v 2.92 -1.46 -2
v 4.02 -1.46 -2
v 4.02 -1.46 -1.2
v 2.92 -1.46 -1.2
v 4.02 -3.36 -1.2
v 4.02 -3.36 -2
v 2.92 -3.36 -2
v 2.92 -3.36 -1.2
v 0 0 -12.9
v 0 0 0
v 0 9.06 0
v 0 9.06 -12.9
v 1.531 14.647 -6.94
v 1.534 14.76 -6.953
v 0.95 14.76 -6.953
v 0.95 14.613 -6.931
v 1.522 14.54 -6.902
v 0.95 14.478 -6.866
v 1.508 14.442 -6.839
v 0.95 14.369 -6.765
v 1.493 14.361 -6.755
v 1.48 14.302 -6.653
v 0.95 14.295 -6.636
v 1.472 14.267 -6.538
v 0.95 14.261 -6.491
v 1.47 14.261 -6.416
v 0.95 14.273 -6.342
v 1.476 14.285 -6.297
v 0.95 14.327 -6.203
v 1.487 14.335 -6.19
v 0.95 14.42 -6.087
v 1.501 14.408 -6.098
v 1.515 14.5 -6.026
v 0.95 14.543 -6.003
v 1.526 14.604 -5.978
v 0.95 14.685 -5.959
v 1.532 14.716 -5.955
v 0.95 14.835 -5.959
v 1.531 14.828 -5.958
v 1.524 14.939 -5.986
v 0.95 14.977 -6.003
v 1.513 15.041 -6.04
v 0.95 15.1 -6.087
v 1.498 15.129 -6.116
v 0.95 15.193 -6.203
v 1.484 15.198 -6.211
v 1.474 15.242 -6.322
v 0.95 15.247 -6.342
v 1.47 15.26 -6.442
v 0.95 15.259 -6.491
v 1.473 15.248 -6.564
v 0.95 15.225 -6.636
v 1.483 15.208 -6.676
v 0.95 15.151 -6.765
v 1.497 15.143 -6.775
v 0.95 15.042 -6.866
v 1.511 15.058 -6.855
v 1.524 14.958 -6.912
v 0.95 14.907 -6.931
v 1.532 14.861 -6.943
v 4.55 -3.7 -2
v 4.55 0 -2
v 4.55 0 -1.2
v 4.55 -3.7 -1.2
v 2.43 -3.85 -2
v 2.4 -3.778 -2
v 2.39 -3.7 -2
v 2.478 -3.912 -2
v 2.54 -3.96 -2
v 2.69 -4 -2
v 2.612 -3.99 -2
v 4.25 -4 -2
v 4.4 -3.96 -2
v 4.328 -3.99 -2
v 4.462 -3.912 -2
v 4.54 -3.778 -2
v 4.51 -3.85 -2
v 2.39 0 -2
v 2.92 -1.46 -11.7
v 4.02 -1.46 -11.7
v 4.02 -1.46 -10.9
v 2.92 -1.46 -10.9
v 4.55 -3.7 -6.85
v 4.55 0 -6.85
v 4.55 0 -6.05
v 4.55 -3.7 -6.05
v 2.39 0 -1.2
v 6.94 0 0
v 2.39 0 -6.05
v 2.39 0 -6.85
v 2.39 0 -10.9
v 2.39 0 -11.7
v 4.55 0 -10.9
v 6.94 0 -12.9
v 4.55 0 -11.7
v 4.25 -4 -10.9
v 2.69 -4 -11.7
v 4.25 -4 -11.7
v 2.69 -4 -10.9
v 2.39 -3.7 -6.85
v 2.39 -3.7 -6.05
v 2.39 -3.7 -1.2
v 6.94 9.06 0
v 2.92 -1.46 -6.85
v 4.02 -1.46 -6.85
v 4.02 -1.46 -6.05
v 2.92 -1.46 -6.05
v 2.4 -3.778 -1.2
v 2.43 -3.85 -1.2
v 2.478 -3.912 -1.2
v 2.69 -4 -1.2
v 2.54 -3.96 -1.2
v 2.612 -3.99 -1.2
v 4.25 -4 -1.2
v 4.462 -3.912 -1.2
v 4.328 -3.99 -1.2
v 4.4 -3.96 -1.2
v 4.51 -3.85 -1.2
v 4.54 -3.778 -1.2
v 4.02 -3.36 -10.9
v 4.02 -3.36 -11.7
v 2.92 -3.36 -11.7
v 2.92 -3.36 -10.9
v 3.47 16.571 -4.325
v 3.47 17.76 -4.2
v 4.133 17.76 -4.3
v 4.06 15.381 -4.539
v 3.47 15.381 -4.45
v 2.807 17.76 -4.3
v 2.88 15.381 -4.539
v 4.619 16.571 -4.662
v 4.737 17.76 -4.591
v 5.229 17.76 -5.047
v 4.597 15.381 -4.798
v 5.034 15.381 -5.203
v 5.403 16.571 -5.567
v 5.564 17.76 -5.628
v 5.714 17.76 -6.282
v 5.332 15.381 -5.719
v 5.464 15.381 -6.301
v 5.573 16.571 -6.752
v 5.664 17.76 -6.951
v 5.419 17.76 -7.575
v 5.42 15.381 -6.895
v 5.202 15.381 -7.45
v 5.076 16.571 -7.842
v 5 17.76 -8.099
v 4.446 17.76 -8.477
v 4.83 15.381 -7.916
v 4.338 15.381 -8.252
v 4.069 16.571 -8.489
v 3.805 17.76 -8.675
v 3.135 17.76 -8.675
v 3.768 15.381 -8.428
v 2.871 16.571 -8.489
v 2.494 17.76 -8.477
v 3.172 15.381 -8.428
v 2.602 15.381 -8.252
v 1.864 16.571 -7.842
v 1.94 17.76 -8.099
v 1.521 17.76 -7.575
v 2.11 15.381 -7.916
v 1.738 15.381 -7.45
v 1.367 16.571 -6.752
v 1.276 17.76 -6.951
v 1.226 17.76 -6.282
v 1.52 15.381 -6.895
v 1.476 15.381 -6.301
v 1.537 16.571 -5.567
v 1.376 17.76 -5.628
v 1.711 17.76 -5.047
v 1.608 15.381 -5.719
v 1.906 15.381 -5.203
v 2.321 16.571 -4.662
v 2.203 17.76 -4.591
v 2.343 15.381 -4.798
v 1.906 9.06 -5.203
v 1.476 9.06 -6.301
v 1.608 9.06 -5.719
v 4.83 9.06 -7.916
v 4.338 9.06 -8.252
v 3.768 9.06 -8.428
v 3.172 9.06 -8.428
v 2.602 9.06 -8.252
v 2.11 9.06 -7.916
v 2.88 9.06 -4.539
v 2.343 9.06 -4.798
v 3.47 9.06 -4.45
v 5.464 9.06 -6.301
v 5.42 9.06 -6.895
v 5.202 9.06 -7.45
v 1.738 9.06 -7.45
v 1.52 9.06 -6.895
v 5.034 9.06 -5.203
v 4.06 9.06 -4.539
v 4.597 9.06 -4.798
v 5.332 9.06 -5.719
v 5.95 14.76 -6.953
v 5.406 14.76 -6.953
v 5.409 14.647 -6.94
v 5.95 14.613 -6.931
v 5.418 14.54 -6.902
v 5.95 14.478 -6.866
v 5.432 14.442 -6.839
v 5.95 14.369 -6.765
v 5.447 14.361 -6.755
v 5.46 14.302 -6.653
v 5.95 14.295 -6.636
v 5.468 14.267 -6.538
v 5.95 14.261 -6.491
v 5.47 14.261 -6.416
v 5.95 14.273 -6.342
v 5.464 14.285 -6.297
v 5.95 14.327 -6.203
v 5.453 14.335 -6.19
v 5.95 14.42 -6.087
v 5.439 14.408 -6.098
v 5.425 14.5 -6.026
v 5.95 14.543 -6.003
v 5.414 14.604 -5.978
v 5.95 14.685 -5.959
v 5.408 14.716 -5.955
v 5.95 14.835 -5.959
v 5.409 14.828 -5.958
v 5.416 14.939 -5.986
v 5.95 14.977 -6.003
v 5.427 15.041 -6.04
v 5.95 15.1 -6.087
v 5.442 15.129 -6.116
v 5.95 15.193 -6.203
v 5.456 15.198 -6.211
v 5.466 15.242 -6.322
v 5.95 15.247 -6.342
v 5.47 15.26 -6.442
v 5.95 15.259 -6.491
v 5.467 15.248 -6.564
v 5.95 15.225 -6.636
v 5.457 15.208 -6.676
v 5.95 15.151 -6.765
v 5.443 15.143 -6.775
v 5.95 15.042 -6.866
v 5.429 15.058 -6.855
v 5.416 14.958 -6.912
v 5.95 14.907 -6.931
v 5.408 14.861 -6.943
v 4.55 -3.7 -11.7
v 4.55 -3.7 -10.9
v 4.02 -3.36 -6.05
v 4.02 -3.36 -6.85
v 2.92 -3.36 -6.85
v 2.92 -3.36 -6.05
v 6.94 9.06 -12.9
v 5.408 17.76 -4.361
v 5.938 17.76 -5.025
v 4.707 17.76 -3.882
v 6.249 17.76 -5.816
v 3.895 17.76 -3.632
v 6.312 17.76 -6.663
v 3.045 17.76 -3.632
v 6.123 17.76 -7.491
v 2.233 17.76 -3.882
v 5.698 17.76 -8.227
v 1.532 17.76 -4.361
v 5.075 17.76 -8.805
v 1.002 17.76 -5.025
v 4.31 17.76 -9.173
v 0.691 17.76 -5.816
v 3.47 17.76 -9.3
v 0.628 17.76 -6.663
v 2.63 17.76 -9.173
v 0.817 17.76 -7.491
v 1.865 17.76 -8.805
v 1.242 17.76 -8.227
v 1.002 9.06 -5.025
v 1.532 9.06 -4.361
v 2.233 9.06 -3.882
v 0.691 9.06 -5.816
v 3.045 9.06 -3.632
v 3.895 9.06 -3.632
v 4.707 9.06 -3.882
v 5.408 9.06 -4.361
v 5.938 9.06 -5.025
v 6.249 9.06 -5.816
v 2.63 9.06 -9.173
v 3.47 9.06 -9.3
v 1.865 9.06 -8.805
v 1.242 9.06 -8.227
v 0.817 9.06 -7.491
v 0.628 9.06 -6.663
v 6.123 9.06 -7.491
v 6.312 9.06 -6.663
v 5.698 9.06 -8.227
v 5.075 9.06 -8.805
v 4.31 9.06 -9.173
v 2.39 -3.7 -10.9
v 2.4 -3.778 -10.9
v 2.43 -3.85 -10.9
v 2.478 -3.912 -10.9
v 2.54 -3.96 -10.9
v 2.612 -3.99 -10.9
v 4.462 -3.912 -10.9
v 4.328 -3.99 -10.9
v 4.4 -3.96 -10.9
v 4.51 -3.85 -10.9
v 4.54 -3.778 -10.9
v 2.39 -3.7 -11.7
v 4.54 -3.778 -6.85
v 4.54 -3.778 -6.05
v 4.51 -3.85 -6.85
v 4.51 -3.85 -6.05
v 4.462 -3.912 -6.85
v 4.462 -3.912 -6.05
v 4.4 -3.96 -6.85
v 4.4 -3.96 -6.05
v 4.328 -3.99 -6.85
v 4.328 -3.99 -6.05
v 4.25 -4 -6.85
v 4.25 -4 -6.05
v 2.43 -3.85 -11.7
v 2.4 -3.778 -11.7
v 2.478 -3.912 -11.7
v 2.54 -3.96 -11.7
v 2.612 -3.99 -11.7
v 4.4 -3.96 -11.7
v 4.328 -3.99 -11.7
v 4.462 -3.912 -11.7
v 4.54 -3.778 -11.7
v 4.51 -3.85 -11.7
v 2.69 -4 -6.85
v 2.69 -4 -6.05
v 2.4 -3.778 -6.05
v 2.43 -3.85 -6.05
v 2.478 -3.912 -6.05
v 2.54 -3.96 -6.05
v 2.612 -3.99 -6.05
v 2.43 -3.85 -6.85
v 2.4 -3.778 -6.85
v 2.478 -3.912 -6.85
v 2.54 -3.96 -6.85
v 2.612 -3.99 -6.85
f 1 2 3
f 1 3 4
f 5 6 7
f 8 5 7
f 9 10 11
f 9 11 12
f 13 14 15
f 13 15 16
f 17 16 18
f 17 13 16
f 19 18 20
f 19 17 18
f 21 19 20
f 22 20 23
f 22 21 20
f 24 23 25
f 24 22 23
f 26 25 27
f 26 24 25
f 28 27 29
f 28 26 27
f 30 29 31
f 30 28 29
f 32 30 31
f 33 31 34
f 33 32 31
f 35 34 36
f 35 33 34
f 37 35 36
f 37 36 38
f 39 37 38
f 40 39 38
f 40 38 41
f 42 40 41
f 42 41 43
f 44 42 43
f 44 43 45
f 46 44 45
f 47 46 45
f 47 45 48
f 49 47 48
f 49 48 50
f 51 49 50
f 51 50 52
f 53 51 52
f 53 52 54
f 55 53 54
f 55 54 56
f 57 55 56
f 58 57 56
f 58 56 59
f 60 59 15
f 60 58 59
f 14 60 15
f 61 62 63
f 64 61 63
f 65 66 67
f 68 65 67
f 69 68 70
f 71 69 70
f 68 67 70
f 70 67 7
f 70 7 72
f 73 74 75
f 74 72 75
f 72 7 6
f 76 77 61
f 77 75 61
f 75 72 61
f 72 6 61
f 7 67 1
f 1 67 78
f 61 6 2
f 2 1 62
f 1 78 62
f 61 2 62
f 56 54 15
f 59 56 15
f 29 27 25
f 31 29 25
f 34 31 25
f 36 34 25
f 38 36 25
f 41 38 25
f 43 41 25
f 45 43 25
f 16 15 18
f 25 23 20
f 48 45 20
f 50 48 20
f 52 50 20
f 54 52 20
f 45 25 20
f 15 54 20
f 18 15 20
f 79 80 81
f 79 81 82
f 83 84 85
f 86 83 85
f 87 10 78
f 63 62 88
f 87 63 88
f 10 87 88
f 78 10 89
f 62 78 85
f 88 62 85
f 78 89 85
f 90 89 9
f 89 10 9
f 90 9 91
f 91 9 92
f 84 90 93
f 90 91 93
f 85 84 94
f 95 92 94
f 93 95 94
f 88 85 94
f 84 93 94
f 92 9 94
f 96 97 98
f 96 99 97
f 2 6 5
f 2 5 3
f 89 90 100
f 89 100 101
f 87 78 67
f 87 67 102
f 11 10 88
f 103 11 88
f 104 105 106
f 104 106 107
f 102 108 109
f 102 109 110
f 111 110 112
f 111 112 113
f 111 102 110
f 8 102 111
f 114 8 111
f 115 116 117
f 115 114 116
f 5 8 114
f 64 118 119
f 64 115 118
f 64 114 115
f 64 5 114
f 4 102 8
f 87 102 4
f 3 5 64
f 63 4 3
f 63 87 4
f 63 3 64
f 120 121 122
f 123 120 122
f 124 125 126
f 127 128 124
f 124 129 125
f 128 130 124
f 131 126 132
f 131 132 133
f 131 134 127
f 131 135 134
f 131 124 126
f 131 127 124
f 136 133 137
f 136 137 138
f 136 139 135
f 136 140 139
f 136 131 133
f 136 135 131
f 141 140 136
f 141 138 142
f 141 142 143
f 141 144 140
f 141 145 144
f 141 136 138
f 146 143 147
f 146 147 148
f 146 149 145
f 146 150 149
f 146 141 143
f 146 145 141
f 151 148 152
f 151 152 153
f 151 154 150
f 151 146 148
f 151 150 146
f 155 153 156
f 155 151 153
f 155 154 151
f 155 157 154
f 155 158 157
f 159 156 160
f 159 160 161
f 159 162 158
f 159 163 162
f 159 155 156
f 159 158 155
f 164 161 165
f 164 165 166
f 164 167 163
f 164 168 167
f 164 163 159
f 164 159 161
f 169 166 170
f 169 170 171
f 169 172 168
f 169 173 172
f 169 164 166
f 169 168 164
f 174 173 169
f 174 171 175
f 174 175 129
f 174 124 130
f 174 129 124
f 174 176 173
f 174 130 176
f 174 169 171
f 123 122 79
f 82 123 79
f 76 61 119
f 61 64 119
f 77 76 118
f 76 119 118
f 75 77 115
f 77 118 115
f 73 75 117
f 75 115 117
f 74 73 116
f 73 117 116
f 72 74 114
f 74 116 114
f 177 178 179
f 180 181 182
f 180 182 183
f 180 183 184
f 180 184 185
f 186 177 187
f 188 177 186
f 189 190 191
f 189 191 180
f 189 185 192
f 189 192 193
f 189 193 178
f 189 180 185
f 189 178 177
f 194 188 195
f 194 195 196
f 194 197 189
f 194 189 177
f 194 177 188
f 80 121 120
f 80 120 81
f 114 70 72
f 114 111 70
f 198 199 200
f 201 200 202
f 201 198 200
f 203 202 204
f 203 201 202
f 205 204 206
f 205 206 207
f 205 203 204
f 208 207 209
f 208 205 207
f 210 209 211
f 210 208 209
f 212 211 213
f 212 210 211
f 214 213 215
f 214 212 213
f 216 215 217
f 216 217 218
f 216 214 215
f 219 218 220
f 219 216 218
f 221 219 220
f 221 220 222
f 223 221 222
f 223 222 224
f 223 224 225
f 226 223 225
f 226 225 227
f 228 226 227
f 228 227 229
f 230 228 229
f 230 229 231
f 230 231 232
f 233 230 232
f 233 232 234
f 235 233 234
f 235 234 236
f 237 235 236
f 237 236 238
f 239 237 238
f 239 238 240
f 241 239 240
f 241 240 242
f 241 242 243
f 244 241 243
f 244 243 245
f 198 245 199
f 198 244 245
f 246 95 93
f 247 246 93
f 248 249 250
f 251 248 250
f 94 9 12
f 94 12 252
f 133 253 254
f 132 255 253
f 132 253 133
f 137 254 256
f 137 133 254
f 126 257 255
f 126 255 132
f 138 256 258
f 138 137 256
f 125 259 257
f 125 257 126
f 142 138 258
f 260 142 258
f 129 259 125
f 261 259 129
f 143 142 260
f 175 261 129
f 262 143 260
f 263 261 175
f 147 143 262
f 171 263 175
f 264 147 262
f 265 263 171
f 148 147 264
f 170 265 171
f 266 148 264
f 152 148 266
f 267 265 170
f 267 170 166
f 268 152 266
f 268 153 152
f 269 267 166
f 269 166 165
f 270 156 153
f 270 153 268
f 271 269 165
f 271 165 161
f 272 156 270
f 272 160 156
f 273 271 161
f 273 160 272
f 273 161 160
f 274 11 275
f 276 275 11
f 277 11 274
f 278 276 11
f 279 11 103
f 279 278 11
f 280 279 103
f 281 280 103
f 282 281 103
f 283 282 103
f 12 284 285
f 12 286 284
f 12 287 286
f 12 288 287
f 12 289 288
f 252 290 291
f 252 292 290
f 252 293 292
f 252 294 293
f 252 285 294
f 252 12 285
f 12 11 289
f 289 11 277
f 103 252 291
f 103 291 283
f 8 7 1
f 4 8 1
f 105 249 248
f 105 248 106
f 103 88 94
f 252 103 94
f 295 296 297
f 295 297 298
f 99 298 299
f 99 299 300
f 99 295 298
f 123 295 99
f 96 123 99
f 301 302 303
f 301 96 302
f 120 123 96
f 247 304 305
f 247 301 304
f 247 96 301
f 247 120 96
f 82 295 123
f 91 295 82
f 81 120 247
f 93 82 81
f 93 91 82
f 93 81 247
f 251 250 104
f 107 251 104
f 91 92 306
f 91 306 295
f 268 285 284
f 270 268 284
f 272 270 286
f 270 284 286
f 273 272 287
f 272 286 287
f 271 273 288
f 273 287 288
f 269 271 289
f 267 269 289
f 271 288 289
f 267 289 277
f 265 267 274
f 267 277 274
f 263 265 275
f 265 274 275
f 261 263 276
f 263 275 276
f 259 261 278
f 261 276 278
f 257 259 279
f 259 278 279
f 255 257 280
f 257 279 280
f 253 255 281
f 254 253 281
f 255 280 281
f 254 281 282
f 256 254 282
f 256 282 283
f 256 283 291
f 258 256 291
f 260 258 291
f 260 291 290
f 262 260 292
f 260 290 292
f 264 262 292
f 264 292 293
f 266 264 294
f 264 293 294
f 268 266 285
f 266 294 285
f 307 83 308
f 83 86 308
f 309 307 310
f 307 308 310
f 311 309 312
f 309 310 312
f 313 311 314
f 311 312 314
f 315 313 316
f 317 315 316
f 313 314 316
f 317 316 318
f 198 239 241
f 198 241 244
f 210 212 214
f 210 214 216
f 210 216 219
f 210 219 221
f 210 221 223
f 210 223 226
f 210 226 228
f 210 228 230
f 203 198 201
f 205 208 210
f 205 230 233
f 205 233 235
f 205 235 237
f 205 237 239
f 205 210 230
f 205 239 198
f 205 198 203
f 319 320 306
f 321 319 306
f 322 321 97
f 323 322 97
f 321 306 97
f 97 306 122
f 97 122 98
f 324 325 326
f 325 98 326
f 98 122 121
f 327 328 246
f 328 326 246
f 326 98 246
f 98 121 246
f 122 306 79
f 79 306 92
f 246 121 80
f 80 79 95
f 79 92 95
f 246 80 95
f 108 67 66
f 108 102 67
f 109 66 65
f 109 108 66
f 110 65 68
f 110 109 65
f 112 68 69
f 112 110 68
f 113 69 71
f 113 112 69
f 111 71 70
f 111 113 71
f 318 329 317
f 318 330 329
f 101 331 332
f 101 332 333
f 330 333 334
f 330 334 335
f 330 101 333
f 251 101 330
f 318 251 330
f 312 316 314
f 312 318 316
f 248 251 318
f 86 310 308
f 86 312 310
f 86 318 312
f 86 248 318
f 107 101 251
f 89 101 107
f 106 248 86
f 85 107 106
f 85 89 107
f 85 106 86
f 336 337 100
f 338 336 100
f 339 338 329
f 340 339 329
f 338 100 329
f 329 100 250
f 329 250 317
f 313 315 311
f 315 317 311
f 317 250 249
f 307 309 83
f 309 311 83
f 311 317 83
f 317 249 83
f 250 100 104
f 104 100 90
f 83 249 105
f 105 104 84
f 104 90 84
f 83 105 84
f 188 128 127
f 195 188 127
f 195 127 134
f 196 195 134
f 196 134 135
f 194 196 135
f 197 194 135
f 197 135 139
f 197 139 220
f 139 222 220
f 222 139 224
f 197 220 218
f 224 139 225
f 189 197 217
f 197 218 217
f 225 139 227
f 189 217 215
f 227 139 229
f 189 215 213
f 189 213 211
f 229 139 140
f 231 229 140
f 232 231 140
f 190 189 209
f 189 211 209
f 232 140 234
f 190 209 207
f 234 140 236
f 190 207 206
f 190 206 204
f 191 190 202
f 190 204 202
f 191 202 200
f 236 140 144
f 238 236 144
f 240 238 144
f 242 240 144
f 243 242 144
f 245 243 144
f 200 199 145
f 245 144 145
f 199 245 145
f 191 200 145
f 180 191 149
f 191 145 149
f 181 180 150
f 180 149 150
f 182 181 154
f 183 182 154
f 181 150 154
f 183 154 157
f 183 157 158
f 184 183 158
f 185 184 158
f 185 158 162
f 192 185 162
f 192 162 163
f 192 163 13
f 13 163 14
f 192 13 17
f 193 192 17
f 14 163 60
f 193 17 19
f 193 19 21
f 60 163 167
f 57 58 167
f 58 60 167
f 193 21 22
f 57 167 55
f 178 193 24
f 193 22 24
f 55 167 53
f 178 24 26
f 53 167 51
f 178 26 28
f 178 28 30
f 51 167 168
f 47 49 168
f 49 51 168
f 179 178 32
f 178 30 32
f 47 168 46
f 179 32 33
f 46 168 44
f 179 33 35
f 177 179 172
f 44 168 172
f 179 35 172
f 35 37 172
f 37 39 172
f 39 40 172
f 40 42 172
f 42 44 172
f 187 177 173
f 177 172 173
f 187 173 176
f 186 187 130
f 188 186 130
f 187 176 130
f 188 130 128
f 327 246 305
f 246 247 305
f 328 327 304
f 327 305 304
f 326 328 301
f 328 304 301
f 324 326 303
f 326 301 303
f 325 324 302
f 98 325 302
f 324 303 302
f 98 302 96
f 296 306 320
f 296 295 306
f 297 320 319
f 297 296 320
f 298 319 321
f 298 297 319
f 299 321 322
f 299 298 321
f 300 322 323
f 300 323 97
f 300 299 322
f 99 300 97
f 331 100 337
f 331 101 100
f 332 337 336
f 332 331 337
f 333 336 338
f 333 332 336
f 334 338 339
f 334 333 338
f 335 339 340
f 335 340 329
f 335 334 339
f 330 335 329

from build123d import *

# Parameters (mm, degrees)
ESQUISSE1_W                  = 6.94
ESQUISSE1_H                  = 12.9
BOSS_EXTRU_1_DEPTH           = 9.06
ESQUISSE2_R                  = 2.85
BOSS_EXTRU_2_DEPTH           = 8.7
ESQUISSE3_R                  = 2
ENL_V_MAT_EXTRU_1_DEPTH      = 8.7
ENL_V_MAT_EXTRU_2_DEPTH      = 2.5
ENL_V_MAT_EXTRU_2_DEPTH_BACK = 2.5
ENL_V_MAT_EXTRU_2_START      = -3.45
ESQUISSE4_R                  = 0.5
CHANFREIN1_SIZE              = 0.25
CHANFREIN1_SIZE2             = 2.378591114
ESQUISSE5_W                  = 2.16
ESQUISSE5_H                  = 0.8
BOSS_EXTRU_3_DEPTH           = 4
CONG_1_R                     = 0.3
ESQUISSE6_W                  = 1.1
ESQUISSE6_H                  = 1.9
ENL_V_MAT_EXTRU_3_DEPTH      = 23.371213646


with BuildPart() as part:
    # Esquisse1 → Boss.-Extru.1 (new body)
    with BuildSketch(Plane(origin=(0, 0, 0), x_dir=(1, 0, 0), z_dir=(0, 1, 0))):
        with Locations((3.47, 6.45)):
            Rectangle(ESQUISSE1_W, ESQUISSE1_H)
    extrude(amount=BOSS_EXTRU_1_DEPTH)

    # Esquisse2 → Boss.-Extru.2 (add)
    with BuildSketch(Plane(origin=(0, 9.06, 0), x_dir=(1, 0, 0), z_dir=(0, 1, 0))):
        with Locations(Location((3.47, 6.45, 0), (0, 0, 90))):
            Circle(ESQUISSE2_R)
    extrude(amount=BOSS_EXTRU_2_DEPTH)

    # Esquisse3 → Enlèv. mat.-Extru.1 (cut)
    with BuildSketch(Plane(origin=(0, 17.76, 0), x_dir=(1, 0, 0), z_dir=(0, 1, 0))):
        with Locations(Location((3.47, 6.45, 0), (0, 0, 270))):
            Circle(ESQUISSE3_R)
    extrude(amount=-ENL_V_MAT_EXTRU_1_DEPTH, mode=Mode.SUBTRACT)

    # Esquisse4 → Enlèv. mat.-Extru.2 (cut, two sides: drawn at the far end of the back side and taken through both)
    with BuildSketch(Plane.ZY.offset(ENL_V_MAT_EXTRU_2_START - ENL_V_MAT_EXTRU_2_DEPTH_BACK)):
        with Locations(Location((-6.453279692, 14.76, 0), (0, 0, 180))):
            Circle(ESQUISSE4_R)
    extrude(amount=ENL_V_MAT_EXTRU_2_DEPTH + ENL_V_MAT_EXTRU_2_DEPTH_BACK, mode=Mode.SUBTRACT)

    # Chanfrein1
    chanfrein1_edges = [part.edges().sort_by_distance(p)[0] for p in [
        (3.47, 17.76, -8.45),
    ]]
    chanfrein1_side = [part.faces().sort_by_distance(p)[0] for p in [
        (3.47, 17.76, -3.680610173),
    ]]
    chamfer(chanfrein1_edges, length=CHANFREIN1_SIZE, length2=CHANFREIN1_SIZE2, reference=chanfrein1_side[0])

    # Esquisse5 → Boss.-Extru.3 (add)
    with BuildSketch(Plane.XZ):
        with Locations((3.47, -1.6)):
            Rectangle(ESQUISSE5_W, ESQUISSE5_H)
        with Locations((3.47, -11.3)):
            Rectangle(ESQUISSE5_W, ESQUISSE5_H)
        with Locations((3.47, -6.45)):
            Rectangle(ESQUISSE5_W, ESQUISSE5_H)
    extrude(amount=BOSS_EXTRU_3_DEPTH)

    # Congé1
    cong_1_edges = [part.edges().sort_by_distance(p)[0] for p in [
        (2.39, -4, -1.6),
        (4.55, -4, -1.6),
        (4.55, -4, -11.3),
        (2.39, -4, -11.3),
        (2.39, -4, -6.45),
        (4.55, -4, -6.45),
    ]]
    fillet(cong_1_edges, radius=CONG_1_R)

    # Esquisse6 → Enlèv. mat.-Extru.3 (cut, through all)
    with BuildSketch(Plane(origin=(0, 0, -11.7), x_dir=(-1, 0, 0), z_dir=(0, 0, -1))):
        with Locations((-3.470290463, -2.41)):
            Rectangle(ESQUISSE6_W, ESQUISSE6_H)
    extrude(amount=-ENL_V_MAT_EXTRU_3_DEPTH, mode=Mode.SUBTRACT)


solid = part.part
